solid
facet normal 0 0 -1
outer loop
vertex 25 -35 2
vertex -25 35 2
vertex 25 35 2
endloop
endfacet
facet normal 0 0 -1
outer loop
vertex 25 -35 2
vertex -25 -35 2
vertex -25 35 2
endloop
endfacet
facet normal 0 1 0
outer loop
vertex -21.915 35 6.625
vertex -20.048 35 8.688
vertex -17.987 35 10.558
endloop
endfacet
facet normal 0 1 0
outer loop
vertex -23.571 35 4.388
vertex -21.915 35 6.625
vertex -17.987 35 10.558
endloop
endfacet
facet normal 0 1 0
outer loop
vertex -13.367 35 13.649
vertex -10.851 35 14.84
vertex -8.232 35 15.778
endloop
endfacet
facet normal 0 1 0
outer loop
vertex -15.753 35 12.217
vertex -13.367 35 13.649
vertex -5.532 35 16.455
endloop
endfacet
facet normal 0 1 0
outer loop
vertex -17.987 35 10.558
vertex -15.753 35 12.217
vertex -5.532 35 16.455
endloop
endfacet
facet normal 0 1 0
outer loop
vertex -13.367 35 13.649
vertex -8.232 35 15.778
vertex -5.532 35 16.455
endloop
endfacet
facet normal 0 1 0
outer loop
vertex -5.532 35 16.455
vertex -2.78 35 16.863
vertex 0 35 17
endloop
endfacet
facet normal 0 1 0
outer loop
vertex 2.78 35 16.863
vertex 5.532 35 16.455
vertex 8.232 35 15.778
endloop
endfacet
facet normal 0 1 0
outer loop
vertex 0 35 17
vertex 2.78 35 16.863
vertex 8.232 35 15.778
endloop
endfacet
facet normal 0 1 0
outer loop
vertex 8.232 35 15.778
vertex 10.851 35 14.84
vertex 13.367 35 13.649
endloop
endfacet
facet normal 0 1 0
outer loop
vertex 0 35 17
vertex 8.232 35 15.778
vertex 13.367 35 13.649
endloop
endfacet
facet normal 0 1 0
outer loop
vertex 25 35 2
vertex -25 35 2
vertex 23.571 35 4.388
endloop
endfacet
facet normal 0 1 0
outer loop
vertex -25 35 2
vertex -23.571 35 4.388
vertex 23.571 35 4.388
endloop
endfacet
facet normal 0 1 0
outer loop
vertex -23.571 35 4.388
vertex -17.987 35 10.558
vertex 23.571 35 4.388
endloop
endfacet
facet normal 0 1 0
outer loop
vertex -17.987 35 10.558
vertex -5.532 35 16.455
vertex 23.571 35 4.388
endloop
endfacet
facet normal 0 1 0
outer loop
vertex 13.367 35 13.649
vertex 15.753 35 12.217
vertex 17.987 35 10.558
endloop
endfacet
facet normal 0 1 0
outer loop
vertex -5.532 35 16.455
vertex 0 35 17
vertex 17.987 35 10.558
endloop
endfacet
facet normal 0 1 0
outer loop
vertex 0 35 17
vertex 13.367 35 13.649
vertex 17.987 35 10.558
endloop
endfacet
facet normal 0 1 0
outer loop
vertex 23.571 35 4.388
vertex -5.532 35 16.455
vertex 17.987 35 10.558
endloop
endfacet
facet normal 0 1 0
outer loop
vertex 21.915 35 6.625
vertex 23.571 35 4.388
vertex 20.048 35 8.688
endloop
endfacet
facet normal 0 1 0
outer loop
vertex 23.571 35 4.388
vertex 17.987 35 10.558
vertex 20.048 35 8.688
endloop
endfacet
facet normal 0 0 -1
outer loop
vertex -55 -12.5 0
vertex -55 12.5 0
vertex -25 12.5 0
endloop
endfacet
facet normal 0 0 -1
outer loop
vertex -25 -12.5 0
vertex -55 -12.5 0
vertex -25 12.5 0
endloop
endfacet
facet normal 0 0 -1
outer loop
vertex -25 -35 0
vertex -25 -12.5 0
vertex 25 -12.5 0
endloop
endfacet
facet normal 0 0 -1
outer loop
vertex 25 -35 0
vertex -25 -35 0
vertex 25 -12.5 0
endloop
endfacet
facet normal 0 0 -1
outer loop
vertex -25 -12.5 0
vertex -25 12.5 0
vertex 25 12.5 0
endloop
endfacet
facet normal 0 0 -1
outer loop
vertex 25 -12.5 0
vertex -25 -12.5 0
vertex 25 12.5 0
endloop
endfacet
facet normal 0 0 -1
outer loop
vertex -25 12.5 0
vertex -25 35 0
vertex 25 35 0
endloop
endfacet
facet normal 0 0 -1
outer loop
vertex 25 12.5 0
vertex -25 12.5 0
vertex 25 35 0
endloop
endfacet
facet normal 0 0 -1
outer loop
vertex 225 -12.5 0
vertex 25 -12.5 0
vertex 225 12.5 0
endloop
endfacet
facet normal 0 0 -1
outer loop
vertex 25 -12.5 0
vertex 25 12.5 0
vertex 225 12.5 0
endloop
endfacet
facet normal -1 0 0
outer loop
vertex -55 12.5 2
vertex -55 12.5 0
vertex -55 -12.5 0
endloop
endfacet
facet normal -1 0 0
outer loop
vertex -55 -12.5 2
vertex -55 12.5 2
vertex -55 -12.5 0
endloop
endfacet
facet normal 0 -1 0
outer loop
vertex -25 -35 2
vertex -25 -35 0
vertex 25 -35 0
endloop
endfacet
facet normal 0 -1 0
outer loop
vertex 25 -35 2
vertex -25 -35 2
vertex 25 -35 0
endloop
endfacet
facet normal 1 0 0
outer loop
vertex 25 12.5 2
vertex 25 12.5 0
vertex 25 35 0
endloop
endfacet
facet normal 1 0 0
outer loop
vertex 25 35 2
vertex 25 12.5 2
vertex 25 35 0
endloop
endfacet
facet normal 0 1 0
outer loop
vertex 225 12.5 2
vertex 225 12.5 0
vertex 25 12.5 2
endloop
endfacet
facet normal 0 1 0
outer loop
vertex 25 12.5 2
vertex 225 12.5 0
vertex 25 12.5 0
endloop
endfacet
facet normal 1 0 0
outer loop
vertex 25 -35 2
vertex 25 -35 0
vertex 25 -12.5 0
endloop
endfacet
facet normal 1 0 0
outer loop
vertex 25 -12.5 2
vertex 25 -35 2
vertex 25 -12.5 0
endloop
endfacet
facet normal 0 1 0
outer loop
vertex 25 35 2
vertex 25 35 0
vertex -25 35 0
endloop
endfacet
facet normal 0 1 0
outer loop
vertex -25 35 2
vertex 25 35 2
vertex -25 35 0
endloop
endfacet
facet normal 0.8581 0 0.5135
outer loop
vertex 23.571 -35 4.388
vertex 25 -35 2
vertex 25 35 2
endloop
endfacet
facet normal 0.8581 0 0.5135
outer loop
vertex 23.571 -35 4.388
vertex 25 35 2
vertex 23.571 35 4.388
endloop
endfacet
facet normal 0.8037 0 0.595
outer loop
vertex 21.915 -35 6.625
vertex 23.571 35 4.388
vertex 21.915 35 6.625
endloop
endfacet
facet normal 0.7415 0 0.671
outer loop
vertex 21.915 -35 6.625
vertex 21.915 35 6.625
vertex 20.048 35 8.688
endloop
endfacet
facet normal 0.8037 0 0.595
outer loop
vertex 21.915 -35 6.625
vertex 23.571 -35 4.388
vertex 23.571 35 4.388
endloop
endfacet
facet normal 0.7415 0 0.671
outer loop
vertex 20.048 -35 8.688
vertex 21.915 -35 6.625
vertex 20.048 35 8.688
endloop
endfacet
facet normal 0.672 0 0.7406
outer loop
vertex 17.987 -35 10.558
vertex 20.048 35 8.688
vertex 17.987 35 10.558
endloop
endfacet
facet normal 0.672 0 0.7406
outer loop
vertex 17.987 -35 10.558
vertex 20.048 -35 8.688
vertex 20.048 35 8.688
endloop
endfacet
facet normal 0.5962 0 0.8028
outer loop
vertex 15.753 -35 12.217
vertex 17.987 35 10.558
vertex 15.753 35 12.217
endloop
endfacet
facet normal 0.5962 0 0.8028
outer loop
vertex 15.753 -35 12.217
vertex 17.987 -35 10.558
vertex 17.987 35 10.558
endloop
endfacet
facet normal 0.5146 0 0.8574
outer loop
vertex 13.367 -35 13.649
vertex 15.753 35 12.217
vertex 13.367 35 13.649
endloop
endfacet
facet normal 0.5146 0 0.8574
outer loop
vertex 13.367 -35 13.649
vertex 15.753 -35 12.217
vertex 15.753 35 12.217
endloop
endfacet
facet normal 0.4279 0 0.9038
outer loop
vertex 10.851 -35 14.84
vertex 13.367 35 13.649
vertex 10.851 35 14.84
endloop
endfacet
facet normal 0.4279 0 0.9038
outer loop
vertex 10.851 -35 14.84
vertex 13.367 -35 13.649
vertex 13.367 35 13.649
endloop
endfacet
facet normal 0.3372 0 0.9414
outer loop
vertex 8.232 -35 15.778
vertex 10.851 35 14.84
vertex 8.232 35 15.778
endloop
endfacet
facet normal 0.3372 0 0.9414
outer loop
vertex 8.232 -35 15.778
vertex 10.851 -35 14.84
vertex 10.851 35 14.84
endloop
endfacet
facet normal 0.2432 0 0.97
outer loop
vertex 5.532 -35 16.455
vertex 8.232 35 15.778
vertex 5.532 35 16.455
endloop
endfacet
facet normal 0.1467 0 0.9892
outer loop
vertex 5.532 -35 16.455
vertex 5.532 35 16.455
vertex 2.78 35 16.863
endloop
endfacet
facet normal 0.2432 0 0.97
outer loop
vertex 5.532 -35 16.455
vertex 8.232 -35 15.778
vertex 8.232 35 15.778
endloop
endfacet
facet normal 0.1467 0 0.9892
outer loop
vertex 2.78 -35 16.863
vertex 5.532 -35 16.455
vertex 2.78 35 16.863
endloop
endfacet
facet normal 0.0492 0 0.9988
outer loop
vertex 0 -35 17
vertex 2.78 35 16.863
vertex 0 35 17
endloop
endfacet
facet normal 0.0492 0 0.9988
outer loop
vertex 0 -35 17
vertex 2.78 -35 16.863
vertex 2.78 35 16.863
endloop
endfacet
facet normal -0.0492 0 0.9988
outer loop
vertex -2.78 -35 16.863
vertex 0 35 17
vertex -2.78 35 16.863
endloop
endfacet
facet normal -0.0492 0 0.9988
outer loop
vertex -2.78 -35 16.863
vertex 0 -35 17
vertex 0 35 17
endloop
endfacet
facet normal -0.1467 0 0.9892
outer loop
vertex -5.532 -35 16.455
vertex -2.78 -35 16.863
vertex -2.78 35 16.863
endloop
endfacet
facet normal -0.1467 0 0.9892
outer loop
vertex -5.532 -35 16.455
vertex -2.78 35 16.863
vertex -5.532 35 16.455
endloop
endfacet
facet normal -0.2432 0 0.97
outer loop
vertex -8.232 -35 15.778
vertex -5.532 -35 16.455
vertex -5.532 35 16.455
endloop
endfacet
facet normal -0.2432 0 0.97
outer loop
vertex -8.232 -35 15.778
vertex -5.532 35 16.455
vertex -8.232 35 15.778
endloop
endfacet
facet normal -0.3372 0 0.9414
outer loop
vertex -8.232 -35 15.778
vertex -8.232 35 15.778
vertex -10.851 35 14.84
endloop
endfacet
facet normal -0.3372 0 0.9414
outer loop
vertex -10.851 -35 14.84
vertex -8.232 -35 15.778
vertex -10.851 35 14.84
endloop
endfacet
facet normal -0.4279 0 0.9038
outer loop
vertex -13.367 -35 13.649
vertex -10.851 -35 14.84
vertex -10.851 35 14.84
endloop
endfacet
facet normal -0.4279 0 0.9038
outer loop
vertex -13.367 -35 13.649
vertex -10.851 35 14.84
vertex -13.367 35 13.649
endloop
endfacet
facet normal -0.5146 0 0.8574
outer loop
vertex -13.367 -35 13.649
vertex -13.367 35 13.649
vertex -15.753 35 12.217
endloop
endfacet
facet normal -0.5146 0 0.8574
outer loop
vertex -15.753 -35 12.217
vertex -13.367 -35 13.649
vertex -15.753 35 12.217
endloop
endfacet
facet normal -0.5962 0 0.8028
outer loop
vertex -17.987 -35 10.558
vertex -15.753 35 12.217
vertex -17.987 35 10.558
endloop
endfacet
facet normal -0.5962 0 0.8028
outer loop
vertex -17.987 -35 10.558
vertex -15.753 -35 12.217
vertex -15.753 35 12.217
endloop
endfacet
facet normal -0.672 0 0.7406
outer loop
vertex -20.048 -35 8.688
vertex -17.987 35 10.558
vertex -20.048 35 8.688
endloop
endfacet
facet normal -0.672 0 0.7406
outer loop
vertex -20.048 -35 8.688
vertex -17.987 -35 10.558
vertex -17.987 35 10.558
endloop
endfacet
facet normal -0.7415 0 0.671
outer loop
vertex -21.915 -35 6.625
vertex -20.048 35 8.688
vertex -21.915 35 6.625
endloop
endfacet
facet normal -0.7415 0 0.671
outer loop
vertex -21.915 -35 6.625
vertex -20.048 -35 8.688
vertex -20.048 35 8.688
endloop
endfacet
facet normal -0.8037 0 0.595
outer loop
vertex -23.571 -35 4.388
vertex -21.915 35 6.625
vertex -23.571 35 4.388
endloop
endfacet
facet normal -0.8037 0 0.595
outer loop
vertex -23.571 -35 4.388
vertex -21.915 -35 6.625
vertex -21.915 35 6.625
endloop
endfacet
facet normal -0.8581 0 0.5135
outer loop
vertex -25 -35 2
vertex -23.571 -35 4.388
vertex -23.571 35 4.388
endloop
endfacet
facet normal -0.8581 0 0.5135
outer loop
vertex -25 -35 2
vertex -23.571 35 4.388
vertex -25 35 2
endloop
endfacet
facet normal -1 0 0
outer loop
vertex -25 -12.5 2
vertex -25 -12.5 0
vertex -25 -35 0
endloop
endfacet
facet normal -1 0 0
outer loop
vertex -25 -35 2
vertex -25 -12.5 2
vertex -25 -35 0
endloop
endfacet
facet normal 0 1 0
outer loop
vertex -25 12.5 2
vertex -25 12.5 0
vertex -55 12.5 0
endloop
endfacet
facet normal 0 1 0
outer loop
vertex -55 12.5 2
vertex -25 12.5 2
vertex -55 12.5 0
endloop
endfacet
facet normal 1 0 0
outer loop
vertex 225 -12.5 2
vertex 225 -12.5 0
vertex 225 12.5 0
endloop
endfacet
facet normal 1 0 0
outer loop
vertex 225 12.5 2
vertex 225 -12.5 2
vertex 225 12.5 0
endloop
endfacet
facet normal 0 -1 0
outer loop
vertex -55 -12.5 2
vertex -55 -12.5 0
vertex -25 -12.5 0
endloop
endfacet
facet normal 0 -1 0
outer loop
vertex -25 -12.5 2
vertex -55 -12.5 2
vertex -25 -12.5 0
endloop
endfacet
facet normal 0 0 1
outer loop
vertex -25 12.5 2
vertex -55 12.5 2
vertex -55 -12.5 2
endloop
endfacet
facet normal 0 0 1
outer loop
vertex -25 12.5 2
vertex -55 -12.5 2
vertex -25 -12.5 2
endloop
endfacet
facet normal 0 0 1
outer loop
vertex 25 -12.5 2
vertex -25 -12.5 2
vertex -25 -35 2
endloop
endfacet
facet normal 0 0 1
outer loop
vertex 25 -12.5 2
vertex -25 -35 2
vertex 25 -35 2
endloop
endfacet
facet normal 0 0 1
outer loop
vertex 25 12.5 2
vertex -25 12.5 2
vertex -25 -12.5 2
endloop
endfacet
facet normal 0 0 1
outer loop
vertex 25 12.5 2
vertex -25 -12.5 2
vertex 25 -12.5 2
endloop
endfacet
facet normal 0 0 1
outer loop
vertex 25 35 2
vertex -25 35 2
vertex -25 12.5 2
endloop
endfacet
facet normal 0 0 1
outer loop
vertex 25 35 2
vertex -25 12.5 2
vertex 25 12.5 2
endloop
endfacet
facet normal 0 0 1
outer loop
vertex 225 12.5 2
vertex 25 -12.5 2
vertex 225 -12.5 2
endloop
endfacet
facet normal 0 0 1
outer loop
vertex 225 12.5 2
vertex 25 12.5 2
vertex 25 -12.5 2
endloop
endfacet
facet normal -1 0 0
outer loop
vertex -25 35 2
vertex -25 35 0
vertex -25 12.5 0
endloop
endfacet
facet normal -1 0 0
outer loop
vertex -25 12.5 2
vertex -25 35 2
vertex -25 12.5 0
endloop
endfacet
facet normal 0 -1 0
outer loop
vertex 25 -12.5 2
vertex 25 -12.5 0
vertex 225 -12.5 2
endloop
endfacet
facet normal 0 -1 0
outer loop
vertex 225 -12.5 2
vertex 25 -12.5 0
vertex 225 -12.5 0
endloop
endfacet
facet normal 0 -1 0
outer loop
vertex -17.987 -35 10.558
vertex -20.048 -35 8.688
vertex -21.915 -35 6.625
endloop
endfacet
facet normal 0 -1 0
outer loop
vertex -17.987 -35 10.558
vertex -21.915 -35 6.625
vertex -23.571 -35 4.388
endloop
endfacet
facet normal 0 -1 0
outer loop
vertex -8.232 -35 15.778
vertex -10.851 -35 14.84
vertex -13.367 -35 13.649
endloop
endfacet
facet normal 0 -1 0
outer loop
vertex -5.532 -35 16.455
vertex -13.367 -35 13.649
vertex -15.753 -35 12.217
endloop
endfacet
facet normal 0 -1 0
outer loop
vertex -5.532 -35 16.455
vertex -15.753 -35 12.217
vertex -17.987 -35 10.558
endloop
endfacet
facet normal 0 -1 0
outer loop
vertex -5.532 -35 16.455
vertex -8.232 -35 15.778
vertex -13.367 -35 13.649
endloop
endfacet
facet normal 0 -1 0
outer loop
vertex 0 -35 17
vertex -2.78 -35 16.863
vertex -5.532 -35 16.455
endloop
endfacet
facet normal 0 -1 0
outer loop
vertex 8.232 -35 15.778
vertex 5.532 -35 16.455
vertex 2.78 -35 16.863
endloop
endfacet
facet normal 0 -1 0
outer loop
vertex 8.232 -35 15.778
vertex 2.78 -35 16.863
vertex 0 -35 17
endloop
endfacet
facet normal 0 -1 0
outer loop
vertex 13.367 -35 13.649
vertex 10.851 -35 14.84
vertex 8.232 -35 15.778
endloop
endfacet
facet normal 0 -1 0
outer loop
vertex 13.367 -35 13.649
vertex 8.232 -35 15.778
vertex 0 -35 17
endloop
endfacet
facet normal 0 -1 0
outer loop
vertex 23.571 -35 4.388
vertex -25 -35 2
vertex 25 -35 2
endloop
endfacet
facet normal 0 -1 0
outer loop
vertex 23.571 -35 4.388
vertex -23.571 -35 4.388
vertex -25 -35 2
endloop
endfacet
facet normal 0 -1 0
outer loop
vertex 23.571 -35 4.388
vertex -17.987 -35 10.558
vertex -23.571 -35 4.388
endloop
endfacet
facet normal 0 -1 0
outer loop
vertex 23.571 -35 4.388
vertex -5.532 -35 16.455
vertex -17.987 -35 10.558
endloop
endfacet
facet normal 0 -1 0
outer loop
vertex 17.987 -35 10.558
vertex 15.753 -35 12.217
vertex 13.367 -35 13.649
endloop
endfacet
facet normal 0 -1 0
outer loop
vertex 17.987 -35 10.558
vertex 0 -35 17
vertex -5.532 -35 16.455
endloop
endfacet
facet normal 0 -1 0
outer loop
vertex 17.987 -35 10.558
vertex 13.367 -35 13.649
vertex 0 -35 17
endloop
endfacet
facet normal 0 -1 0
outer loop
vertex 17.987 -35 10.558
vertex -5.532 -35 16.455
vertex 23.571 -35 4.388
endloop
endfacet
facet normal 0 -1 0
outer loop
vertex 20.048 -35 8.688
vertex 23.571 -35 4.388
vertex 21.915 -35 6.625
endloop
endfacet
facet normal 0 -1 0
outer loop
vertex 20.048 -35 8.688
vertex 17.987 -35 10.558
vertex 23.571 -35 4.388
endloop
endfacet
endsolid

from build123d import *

# Parameters (mm, degrees)
F1_DEPTH      = 2
F3_DEPTH      = 35
F3_DEPTH_BACK = 35


with BuildPart() as f1:
    # F0 (on Top) → F1 (new body)
    with BuildSketch(Plane.XY):
        Polygon((25, 15), (25, 35), (-25, 35), (-25, 15), (-25, 12.5), (-55, 12.5), (-55, -12.5), (-25, -12.5), (-25, -15), (-25, -35), (25, -35), (25, -15), (25, -12.5), (225, -12.5), (225, 12.5), (25, 12.5), align=None)
    extrude(amount=F1_DEPTH)


with BuildPart() as f3:
    # F2 (on Front) → F3 (new body, two sides)
    with BuildSketch(Plane.XZ) as f3_sk:
        with BuildLine():
            Line((-25, 2), (25, 2))
            ThreePointArc((25, 2), (0, 17), (-25, 2))
        make_face()
    extrude(amount=F3_DEPTH)
    extrude(f3_sk.sketch, amount=-F3_DEPTH_BACK)


solid = Compound([f1.part, f3.part])
